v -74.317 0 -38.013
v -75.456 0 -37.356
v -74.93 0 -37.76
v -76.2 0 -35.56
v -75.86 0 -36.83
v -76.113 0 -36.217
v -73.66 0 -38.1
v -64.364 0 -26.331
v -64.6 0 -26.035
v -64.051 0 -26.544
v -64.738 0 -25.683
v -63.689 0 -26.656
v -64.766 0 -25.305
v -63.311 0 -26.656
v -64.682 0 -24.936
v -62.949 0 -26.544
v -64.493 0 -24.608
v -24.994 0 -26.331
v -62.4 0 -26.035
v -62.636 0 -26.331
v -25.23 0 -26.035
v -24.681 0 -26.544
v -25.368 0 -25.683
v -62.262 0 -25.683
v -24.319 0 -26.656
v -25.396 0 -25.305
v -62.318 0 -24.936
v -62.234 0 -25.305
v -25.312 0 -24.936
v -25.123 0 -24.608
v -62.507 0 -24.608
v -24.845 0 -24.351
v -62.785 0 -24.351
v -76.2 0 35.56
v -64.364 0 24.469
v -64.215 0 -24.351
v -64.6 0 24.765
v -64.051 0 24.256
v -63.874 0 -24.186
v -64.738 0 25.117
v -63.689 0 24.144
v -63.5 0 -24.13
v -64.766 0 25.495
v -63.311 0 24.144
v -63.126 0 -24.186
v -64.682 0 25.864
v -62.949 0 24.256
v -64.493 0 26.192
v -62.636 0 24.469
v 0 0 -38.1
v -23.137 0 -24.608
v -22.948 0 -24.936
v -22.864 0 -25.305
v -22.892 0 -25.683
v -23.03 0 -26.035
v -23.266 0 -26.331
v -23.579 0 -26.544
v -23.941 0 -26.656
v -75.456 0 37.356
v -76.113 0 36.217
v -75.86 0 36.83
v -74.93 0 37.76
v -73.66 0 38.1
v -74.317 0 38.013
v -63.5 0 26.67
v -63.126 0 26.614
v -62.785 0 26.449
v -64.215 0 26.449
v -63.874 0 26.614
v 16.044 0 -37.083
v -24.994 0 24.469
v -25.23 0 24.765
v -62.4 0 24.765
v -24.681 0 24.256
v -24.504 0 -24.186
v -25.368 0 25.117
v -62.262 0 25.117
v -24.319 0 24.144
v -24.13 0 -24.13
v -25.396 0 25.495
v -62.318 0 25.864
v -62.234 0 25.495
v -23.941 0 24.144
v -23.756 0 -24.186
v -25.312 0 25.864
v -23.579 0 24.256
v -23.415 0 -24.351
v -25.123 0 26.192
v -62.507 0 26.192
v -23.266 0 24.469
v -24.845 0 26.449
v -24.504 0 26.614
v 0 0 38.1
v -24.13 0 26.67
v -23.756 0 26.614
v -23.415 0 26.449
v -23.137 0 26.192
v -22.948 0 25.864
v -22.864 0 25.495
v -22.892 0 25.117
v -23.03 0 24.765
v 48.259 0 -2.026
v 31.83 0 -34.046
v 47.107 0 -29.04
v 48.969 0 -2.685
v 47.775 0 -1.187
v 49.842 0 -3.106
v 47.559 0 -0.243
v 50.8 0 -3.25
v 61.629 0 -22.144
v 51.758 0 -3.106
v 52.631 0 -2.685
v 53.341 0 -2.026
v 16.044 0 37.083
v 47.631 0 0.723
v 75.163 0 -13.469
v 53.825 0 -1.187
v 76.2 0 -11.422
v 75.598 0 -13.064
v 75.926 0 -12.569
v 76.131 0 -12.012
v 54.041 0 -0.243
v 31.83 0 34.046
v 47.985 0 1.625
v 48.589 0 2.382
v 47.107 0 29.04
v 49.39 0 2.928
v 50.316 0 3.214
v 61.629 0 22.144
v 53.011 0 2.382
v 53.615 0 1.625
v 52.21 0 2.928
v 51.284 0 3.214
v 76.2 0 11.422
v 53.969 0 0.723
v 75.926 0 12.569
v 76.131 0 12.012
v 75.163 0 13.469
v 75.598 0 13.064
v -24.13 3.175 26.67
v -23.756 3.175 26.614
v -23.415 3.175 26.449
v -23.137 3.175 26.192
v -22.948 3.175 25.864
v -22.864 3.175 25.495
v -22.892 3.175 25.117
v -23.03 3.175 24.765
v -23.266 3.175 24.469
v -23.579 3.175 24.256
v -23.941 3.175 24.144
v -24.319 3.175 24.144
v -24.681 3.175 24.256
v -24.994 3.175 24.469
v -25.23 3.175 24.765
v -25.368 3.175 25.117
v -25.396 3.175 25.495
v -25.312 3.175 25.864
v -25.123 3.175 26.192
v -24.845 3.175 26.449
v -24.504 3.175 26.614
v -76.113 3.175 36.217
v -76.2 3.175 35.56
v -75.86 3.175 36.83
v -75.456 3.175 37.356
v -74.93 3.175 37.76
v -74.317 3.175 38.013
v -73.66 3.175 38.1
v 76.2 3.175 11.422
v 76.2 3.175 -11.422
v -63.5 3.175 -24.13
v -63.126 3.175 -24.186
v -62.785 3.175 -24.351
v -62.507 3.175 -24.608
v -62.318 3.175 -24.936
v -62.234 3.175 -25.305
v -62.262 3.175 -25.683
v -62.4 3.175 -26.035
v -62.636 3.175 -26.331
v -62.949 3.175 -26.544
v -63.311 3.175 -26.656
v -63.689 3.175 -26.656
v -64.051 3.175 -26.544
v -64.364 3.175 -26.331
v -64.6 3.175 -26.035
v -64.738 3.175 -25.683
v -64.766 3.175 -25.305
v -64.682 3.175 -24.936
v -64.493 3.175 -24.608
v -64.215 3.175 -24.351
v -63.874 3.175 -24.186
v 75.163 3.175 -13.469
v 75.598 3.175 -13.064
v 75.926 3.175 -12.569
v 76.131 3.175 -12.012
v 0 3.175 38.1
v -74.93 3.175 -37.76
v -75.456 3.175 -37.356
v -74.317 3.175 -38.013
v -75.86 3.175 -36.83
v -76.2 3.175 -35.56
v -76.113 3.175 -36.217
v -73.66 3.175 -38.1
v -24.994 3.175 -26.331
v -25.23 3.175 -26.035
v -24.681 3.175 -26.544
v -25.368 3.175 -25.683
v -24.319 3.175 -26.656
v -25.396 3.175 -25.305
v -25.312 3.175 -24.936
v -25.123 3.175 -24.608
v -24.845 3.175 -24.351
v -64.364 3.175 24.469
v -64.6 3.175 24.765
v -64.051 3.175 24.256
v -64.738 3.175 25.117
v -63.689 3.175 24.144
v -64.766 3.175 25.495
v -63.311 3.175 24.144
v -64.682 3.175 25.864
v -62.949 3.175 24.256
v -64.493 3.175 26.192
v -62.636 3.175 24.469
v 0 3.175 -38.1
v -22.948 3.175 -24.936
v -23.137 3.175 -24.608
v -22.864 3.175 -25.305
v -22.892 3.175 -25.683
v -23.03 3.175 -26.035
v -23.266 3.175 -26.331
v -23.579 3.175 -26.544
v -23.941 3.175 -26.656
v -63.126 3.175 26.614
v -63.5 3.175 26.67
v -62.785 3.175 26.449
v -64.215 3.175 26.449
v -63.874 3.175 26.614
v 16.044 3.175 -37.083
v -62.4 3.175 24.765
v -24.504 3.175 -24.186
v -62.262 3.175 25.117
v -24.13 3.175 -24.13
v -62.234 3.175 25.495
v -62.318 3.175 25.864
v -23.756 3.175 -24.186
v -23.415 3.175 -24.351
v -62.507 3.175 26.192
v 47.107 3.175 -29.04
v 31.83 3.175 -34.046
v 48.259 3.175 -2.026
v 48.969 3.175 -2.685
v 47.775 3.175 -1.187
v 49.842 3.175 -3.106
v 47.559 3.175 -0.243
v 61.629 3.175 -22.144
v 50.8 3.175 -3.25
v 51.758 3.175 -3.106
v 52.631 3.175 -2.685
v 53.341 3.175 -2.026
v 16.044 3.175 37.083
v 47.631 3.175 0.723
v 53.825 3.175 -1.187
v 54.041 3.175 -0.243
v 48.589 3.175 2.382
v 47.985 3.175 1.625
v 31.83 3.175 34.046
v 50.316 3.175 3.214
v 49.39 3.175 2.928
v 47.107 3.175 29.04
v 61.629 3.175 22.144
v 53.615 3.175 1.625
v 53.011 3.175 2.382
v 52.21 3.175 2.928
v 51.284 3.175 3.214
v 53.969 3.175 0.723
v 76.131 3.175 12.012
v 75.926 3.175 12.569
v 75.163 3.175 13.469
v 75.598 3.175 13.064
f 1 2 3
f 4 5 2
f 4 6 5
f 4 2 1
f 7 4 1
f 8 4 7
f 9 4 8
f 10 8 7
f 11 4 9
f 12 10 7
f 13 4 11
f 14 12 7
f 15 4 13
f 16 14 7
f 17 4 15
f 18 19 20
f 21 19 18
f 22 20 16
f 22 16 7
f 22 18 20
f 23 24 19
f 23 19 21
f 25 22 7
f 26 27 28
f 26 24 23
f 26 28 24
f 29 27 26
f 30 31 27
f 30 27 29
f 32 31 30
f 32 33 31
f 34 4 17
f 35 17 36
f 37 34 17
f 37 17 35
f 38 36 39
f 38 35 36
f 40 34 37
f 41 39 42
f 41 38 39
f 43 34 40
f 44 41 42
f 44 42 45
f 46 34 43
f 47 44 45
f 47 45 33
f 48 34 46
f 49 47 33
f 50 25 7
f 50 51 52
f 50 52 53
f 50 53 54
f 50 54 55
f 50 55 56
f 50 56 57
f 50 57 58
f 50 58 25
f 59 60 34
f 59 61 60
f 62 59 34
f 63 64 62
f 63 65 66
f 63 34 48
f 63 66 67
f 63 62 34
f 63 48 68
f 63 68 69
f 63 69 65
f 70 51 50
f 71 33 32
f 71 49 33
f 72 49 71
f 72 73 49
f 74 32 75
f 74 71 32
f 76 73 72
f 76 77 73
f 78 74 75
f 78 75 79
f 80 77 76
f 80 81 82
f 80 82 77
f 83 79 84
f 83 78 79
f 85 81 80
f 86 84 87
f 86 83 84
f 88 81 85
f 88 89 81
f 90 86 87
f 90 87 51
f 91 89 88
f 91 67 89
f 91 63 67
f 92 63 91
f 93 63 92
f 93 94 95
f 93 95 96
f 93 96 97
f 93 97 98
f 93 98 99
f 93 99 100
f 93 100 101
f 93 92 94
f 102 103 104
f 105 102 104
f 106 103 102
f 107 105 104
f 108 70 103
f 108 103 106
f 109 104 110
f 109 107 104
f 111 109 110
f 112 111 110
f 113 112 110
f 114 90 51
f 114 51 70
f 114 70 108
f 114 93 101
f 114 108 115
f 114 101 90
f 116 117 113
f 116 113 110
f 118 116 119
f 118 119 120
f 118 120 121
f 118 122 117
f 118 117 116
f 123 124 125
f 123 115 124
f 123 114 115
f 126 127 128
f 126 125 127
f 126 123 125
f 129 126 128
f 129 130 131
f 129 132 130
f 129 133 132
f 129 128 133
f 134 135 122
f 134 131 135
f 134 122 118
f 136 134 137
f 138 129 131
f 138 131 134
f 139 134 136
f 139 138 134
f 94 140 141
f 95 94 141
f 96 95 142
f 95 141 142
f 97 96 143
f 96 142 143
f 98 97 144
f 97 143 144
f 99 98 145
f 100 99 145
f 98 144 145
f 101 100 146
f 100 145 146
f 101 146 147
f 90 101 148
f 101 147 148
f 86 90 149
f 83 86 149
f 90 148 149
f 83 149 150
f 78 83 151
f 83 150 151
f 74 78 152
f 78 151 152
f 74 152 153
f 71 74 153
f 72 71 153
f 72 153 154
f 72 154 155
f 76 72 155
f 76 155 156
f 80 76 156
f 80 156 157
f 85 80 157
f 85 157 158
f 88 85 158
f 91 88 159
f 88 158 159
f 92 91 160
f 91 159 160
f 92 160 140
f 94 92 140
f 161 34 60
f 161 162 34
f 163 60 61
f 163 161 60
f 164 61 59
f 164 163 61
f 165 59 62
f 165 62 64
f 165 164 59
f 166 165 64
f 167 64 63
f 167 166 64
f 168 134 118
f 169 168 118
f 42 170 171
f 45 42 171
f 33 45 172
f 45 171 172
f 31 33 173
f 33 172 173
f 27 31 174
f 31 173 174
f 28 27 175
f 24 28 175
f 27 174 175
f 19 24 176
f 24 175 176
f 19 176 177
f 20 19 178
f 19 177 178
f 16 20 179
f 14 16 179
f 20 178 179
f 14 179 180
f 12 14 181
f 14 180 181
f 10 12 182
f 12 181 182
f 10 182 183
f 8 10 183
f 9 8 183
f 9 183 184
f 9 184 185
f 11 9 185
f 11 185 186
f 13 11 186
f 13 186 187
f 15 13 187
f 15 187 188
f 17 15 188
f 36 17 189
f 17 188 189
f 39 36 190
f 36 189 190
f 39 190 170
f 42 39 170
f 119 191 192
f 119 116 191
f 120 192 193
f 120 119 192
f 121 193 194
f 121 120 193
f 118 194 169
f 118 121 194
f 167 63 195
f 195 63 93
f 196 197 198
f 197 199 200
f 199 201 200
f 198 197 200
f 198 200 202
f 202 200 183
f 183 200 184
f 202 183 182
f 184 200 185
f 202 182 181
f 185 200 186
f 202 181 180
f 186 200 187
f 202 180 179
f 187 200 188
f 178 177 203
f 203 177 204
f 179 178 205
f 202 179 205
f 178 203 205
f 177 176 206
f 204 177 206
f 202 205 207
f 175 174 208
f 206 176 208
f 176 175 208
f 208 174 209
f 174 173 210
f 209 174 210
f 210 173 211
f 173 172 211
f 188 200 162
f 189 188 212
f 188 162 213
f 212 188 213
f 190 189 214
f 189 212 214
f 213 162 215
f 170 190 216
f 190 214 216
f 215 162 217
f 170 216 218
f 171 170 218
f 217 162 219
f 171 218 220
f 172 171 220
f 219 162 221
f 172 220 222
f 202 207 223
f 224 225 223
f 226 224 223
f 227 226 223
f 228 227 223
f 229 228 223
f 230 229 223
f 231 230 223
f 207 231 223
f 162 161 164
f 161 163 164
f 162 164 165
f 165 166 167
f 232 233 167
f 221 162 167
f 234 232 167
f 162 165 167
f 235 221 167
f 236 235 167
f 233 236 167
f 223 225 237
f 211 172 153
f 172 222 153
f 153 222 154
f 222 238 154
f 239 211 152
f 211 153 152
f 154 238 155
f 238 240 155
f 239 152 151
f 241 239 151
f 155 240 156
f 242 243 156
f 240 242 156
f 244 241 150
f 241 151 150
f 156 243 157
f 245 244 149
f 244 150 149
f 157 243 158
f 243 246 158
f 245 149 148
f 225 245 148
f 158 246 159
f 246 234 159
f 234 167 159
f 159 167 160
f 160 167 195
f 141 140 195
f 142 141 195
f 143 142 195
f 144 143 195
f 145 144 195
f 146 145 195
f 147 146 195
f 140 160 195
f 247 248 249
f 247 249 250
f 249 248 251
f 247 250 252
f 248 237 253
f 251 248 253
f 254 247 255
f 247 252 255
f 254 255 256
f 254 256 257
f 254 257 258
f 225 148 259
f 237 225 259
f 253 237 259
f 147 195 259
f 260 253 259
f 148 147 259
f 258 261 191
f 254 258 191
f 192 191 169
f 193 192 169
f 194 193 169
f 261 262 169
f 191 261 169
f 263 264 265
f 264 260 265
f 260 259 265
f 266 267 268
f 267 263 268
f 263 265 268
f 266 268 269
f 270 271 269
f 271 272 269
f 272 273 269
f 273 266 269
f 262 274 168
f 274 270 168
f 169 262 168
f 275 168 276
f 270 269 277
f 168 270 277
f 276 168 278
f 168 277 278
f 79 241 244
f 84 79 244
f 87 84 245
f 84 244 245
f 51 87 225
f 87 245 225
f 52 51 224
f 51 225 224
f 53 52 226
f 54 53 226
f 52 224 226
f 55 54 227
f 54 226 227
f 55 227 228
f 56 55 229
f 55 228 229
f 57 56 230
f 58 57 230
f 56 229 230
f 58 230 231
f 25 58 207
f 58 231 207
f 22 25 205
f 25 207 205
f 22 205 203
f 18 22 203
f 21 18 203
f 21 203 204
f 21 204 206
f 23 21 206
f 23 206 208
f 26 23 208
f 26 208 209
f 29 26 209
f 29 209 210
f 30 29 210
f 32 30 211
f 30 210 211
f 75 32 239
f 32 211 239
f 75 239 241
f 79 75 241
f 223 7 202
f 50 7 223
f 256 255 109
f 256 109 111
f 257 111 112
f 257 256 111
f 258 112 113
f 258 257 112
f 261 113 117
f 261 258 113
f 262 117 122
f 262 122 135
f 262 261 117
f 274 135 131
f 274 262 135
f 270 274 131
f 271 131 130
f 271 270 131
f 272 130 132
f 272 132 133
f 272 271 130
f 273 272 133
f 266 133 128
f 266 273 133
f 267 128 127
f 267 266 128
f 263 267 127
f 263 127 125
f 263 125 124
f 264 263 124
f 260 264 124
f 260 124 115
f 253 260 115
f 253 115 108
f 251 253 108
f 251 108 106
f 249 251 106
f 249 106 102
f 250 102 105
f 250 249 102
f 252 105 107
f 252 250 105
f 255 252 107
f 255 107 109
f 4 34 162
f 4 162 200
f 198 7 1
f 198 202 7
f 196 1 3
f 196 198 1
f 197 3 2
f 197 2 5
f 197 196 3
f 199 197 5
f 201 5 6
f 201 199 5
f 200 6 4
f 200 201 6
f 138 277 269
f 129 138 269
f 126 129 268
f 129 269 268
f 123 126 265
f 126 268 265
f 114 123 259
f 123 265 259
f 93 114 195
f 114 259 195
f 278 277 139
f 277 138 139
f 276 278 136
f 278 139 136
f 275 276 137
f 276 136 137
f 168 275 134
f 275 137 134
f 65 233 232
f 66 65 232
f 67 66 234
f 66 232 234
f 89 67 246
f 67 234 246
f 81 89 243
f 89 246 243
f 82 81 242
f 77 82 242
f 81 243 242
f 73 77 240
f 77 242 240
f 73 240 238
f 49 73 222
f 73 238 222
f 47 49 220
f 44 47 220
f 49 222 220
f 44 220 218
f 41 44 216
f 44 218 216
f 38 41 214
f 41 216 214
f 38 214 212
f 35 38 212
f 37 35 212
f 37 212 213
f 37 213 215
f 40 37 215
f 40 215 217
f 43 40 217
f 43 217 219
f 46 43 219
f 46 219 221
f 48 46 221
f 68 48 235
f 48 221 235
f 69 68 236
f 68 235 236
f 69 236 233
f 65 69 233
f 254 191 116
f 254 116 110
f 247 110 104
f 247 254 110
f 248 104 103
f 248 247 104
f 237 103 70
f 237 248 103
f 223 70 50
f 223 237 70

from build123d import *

# Parameters (mm, degrees)
SKETCH1_W           = 152.4
SKETCH1_H           = 76.2
BOSS_EXTRUDE1_DEPTH = 3.175
CUT_EXTRUDE1_DEPTH  = 3.175
FILLET2_R           = 2.54
FILLET3_R           = 2.54
SKETCH5_R           = 7.62
CUT_EXTRUDE2_DEPTH  = 3.175
SKETCH6_R           = 1.27
CUT_EXTRUDE3_DEPTH  = 3.175
BOSS_EXTRUDE2_START = -3.175
SKETCH7_R           = 7.62
SKETCH7_R_2         = 3.25
BOSS_EXTRUDE2_DEPTH = 3.175


with BuildPart() as part:
    # Sketch1 → Boss-Extrude1 (new body)
    with BuildSketch(Plane(origin=(0, 0, 0), x_dir=(1, 0, 0), z_dir=(0, 1, 0))):
        Rectangle(SKETCH1_W, SKETCH1_H)
    extrude(amount=BOSS_EXTRUDE1_DEPTH)

    # Sketch4 → Cut-Extrude1 (cut)
    with BuildSketch(Plane(origin=(0, 3.175, 0), x_dir=(1, 0, 0), z_dir=(0, 1, 0))):
        with BuildLine():
            Line((0, 38.1), (76.2, 38.1))
            Line((76.2, 38.1), (76.2, 12.7))
            ThreePointArc((76.2, 12.7), (40.160926284, 31.582778852), (0, 38.1))
        make_face()
        with BuildLine():
            Line((76.2, -38.1), (76.2, -12.7))
            ThreePointArc((76.2, -12.7), (40.160926284, -31.582778852), (0, -38.1))
            Line((0, -38.1), (76.2, -38.1))
        make_face()
    extrude(amount=-CUT_EXTRUDE1_DEPTH, mode=Mode.SUBTRACT)

    # Fillet2
    fillet2_edges = [part.edges().sort_by_distance(p)[0] for p in [
        (76.2, 1.5875, -12.7),
        (76.2, 1.5875, 12.7),
    ]]
    fillet(fillet2_edges, radius=FILLET2_R)

    # Fillet3
    fillet3_edges = [part.edges().sort_by_distance(p)[0] for p in [
        (-76.2, 1.5875, -38.1),
        (-76.2, 1.5875, 38.1),
    ]]
    fillet(fillet3_edges, radius=FILLET3_R)

    # Sketch5 → Cut-Extrude2 (cut)
    with BuildSketch(Plane(origin=(0, 3.175, 0), x_dir=(1, 0, 0), z_dir=(0, 1, 0))):
        with Locations(Location((50.8, 0, 0), (0, 0, 270))):
            Circle(SKETCH5_R)
    extrude(amount=-CUT_EXTRUDE2_DEPTH, mode=Mode.SUBTRACT)

    # Sketch6 → Cut-Extrude3 (cut)
    with BuildSketch(Plane(origin=(0, 3.175, 0), x_dir=(1, 0, 0), z_dir=(0, 1, 0))):
        with Locations(Location((-63.5, 25.4, 0), (0, 0, 270))):
            Circle(SKETCH6_R)
        with Locations(Location((-63.5, -25.4, 0), (0, 0, 270))):
            Circle(SKETCH6_R)
        with Locations(Location((-24.13, 25.4, 0), (0, 0, 270))):
            Circle(SKETCH6_R)
        with Locations(Location((-24.13, -25.4, 0), (0, 0, 270))):
            Circle(SKETCH6_R)
    extrude(amount=-CUT_EXTRUDE3_DEPTH, mode=Mode.SUBTRACT)

    # Sketch7 → Boss-Extrude2 (add)
    with BuildSketch(Plane.XZ.offset(BOSS_EXTRUDE2_START)):
        with Locations((50.8, 0)):
            Circle(SKETCH7_R)
        with Locations(Location((50.8, 0, 0), (0, 0, 270))):
            Circle(SKETCH7_R_2, mode=Mode.SUBTRACT)
    extrude(amount=BOSS_EXTRUDE2_DEPTH)


solid = part.part
